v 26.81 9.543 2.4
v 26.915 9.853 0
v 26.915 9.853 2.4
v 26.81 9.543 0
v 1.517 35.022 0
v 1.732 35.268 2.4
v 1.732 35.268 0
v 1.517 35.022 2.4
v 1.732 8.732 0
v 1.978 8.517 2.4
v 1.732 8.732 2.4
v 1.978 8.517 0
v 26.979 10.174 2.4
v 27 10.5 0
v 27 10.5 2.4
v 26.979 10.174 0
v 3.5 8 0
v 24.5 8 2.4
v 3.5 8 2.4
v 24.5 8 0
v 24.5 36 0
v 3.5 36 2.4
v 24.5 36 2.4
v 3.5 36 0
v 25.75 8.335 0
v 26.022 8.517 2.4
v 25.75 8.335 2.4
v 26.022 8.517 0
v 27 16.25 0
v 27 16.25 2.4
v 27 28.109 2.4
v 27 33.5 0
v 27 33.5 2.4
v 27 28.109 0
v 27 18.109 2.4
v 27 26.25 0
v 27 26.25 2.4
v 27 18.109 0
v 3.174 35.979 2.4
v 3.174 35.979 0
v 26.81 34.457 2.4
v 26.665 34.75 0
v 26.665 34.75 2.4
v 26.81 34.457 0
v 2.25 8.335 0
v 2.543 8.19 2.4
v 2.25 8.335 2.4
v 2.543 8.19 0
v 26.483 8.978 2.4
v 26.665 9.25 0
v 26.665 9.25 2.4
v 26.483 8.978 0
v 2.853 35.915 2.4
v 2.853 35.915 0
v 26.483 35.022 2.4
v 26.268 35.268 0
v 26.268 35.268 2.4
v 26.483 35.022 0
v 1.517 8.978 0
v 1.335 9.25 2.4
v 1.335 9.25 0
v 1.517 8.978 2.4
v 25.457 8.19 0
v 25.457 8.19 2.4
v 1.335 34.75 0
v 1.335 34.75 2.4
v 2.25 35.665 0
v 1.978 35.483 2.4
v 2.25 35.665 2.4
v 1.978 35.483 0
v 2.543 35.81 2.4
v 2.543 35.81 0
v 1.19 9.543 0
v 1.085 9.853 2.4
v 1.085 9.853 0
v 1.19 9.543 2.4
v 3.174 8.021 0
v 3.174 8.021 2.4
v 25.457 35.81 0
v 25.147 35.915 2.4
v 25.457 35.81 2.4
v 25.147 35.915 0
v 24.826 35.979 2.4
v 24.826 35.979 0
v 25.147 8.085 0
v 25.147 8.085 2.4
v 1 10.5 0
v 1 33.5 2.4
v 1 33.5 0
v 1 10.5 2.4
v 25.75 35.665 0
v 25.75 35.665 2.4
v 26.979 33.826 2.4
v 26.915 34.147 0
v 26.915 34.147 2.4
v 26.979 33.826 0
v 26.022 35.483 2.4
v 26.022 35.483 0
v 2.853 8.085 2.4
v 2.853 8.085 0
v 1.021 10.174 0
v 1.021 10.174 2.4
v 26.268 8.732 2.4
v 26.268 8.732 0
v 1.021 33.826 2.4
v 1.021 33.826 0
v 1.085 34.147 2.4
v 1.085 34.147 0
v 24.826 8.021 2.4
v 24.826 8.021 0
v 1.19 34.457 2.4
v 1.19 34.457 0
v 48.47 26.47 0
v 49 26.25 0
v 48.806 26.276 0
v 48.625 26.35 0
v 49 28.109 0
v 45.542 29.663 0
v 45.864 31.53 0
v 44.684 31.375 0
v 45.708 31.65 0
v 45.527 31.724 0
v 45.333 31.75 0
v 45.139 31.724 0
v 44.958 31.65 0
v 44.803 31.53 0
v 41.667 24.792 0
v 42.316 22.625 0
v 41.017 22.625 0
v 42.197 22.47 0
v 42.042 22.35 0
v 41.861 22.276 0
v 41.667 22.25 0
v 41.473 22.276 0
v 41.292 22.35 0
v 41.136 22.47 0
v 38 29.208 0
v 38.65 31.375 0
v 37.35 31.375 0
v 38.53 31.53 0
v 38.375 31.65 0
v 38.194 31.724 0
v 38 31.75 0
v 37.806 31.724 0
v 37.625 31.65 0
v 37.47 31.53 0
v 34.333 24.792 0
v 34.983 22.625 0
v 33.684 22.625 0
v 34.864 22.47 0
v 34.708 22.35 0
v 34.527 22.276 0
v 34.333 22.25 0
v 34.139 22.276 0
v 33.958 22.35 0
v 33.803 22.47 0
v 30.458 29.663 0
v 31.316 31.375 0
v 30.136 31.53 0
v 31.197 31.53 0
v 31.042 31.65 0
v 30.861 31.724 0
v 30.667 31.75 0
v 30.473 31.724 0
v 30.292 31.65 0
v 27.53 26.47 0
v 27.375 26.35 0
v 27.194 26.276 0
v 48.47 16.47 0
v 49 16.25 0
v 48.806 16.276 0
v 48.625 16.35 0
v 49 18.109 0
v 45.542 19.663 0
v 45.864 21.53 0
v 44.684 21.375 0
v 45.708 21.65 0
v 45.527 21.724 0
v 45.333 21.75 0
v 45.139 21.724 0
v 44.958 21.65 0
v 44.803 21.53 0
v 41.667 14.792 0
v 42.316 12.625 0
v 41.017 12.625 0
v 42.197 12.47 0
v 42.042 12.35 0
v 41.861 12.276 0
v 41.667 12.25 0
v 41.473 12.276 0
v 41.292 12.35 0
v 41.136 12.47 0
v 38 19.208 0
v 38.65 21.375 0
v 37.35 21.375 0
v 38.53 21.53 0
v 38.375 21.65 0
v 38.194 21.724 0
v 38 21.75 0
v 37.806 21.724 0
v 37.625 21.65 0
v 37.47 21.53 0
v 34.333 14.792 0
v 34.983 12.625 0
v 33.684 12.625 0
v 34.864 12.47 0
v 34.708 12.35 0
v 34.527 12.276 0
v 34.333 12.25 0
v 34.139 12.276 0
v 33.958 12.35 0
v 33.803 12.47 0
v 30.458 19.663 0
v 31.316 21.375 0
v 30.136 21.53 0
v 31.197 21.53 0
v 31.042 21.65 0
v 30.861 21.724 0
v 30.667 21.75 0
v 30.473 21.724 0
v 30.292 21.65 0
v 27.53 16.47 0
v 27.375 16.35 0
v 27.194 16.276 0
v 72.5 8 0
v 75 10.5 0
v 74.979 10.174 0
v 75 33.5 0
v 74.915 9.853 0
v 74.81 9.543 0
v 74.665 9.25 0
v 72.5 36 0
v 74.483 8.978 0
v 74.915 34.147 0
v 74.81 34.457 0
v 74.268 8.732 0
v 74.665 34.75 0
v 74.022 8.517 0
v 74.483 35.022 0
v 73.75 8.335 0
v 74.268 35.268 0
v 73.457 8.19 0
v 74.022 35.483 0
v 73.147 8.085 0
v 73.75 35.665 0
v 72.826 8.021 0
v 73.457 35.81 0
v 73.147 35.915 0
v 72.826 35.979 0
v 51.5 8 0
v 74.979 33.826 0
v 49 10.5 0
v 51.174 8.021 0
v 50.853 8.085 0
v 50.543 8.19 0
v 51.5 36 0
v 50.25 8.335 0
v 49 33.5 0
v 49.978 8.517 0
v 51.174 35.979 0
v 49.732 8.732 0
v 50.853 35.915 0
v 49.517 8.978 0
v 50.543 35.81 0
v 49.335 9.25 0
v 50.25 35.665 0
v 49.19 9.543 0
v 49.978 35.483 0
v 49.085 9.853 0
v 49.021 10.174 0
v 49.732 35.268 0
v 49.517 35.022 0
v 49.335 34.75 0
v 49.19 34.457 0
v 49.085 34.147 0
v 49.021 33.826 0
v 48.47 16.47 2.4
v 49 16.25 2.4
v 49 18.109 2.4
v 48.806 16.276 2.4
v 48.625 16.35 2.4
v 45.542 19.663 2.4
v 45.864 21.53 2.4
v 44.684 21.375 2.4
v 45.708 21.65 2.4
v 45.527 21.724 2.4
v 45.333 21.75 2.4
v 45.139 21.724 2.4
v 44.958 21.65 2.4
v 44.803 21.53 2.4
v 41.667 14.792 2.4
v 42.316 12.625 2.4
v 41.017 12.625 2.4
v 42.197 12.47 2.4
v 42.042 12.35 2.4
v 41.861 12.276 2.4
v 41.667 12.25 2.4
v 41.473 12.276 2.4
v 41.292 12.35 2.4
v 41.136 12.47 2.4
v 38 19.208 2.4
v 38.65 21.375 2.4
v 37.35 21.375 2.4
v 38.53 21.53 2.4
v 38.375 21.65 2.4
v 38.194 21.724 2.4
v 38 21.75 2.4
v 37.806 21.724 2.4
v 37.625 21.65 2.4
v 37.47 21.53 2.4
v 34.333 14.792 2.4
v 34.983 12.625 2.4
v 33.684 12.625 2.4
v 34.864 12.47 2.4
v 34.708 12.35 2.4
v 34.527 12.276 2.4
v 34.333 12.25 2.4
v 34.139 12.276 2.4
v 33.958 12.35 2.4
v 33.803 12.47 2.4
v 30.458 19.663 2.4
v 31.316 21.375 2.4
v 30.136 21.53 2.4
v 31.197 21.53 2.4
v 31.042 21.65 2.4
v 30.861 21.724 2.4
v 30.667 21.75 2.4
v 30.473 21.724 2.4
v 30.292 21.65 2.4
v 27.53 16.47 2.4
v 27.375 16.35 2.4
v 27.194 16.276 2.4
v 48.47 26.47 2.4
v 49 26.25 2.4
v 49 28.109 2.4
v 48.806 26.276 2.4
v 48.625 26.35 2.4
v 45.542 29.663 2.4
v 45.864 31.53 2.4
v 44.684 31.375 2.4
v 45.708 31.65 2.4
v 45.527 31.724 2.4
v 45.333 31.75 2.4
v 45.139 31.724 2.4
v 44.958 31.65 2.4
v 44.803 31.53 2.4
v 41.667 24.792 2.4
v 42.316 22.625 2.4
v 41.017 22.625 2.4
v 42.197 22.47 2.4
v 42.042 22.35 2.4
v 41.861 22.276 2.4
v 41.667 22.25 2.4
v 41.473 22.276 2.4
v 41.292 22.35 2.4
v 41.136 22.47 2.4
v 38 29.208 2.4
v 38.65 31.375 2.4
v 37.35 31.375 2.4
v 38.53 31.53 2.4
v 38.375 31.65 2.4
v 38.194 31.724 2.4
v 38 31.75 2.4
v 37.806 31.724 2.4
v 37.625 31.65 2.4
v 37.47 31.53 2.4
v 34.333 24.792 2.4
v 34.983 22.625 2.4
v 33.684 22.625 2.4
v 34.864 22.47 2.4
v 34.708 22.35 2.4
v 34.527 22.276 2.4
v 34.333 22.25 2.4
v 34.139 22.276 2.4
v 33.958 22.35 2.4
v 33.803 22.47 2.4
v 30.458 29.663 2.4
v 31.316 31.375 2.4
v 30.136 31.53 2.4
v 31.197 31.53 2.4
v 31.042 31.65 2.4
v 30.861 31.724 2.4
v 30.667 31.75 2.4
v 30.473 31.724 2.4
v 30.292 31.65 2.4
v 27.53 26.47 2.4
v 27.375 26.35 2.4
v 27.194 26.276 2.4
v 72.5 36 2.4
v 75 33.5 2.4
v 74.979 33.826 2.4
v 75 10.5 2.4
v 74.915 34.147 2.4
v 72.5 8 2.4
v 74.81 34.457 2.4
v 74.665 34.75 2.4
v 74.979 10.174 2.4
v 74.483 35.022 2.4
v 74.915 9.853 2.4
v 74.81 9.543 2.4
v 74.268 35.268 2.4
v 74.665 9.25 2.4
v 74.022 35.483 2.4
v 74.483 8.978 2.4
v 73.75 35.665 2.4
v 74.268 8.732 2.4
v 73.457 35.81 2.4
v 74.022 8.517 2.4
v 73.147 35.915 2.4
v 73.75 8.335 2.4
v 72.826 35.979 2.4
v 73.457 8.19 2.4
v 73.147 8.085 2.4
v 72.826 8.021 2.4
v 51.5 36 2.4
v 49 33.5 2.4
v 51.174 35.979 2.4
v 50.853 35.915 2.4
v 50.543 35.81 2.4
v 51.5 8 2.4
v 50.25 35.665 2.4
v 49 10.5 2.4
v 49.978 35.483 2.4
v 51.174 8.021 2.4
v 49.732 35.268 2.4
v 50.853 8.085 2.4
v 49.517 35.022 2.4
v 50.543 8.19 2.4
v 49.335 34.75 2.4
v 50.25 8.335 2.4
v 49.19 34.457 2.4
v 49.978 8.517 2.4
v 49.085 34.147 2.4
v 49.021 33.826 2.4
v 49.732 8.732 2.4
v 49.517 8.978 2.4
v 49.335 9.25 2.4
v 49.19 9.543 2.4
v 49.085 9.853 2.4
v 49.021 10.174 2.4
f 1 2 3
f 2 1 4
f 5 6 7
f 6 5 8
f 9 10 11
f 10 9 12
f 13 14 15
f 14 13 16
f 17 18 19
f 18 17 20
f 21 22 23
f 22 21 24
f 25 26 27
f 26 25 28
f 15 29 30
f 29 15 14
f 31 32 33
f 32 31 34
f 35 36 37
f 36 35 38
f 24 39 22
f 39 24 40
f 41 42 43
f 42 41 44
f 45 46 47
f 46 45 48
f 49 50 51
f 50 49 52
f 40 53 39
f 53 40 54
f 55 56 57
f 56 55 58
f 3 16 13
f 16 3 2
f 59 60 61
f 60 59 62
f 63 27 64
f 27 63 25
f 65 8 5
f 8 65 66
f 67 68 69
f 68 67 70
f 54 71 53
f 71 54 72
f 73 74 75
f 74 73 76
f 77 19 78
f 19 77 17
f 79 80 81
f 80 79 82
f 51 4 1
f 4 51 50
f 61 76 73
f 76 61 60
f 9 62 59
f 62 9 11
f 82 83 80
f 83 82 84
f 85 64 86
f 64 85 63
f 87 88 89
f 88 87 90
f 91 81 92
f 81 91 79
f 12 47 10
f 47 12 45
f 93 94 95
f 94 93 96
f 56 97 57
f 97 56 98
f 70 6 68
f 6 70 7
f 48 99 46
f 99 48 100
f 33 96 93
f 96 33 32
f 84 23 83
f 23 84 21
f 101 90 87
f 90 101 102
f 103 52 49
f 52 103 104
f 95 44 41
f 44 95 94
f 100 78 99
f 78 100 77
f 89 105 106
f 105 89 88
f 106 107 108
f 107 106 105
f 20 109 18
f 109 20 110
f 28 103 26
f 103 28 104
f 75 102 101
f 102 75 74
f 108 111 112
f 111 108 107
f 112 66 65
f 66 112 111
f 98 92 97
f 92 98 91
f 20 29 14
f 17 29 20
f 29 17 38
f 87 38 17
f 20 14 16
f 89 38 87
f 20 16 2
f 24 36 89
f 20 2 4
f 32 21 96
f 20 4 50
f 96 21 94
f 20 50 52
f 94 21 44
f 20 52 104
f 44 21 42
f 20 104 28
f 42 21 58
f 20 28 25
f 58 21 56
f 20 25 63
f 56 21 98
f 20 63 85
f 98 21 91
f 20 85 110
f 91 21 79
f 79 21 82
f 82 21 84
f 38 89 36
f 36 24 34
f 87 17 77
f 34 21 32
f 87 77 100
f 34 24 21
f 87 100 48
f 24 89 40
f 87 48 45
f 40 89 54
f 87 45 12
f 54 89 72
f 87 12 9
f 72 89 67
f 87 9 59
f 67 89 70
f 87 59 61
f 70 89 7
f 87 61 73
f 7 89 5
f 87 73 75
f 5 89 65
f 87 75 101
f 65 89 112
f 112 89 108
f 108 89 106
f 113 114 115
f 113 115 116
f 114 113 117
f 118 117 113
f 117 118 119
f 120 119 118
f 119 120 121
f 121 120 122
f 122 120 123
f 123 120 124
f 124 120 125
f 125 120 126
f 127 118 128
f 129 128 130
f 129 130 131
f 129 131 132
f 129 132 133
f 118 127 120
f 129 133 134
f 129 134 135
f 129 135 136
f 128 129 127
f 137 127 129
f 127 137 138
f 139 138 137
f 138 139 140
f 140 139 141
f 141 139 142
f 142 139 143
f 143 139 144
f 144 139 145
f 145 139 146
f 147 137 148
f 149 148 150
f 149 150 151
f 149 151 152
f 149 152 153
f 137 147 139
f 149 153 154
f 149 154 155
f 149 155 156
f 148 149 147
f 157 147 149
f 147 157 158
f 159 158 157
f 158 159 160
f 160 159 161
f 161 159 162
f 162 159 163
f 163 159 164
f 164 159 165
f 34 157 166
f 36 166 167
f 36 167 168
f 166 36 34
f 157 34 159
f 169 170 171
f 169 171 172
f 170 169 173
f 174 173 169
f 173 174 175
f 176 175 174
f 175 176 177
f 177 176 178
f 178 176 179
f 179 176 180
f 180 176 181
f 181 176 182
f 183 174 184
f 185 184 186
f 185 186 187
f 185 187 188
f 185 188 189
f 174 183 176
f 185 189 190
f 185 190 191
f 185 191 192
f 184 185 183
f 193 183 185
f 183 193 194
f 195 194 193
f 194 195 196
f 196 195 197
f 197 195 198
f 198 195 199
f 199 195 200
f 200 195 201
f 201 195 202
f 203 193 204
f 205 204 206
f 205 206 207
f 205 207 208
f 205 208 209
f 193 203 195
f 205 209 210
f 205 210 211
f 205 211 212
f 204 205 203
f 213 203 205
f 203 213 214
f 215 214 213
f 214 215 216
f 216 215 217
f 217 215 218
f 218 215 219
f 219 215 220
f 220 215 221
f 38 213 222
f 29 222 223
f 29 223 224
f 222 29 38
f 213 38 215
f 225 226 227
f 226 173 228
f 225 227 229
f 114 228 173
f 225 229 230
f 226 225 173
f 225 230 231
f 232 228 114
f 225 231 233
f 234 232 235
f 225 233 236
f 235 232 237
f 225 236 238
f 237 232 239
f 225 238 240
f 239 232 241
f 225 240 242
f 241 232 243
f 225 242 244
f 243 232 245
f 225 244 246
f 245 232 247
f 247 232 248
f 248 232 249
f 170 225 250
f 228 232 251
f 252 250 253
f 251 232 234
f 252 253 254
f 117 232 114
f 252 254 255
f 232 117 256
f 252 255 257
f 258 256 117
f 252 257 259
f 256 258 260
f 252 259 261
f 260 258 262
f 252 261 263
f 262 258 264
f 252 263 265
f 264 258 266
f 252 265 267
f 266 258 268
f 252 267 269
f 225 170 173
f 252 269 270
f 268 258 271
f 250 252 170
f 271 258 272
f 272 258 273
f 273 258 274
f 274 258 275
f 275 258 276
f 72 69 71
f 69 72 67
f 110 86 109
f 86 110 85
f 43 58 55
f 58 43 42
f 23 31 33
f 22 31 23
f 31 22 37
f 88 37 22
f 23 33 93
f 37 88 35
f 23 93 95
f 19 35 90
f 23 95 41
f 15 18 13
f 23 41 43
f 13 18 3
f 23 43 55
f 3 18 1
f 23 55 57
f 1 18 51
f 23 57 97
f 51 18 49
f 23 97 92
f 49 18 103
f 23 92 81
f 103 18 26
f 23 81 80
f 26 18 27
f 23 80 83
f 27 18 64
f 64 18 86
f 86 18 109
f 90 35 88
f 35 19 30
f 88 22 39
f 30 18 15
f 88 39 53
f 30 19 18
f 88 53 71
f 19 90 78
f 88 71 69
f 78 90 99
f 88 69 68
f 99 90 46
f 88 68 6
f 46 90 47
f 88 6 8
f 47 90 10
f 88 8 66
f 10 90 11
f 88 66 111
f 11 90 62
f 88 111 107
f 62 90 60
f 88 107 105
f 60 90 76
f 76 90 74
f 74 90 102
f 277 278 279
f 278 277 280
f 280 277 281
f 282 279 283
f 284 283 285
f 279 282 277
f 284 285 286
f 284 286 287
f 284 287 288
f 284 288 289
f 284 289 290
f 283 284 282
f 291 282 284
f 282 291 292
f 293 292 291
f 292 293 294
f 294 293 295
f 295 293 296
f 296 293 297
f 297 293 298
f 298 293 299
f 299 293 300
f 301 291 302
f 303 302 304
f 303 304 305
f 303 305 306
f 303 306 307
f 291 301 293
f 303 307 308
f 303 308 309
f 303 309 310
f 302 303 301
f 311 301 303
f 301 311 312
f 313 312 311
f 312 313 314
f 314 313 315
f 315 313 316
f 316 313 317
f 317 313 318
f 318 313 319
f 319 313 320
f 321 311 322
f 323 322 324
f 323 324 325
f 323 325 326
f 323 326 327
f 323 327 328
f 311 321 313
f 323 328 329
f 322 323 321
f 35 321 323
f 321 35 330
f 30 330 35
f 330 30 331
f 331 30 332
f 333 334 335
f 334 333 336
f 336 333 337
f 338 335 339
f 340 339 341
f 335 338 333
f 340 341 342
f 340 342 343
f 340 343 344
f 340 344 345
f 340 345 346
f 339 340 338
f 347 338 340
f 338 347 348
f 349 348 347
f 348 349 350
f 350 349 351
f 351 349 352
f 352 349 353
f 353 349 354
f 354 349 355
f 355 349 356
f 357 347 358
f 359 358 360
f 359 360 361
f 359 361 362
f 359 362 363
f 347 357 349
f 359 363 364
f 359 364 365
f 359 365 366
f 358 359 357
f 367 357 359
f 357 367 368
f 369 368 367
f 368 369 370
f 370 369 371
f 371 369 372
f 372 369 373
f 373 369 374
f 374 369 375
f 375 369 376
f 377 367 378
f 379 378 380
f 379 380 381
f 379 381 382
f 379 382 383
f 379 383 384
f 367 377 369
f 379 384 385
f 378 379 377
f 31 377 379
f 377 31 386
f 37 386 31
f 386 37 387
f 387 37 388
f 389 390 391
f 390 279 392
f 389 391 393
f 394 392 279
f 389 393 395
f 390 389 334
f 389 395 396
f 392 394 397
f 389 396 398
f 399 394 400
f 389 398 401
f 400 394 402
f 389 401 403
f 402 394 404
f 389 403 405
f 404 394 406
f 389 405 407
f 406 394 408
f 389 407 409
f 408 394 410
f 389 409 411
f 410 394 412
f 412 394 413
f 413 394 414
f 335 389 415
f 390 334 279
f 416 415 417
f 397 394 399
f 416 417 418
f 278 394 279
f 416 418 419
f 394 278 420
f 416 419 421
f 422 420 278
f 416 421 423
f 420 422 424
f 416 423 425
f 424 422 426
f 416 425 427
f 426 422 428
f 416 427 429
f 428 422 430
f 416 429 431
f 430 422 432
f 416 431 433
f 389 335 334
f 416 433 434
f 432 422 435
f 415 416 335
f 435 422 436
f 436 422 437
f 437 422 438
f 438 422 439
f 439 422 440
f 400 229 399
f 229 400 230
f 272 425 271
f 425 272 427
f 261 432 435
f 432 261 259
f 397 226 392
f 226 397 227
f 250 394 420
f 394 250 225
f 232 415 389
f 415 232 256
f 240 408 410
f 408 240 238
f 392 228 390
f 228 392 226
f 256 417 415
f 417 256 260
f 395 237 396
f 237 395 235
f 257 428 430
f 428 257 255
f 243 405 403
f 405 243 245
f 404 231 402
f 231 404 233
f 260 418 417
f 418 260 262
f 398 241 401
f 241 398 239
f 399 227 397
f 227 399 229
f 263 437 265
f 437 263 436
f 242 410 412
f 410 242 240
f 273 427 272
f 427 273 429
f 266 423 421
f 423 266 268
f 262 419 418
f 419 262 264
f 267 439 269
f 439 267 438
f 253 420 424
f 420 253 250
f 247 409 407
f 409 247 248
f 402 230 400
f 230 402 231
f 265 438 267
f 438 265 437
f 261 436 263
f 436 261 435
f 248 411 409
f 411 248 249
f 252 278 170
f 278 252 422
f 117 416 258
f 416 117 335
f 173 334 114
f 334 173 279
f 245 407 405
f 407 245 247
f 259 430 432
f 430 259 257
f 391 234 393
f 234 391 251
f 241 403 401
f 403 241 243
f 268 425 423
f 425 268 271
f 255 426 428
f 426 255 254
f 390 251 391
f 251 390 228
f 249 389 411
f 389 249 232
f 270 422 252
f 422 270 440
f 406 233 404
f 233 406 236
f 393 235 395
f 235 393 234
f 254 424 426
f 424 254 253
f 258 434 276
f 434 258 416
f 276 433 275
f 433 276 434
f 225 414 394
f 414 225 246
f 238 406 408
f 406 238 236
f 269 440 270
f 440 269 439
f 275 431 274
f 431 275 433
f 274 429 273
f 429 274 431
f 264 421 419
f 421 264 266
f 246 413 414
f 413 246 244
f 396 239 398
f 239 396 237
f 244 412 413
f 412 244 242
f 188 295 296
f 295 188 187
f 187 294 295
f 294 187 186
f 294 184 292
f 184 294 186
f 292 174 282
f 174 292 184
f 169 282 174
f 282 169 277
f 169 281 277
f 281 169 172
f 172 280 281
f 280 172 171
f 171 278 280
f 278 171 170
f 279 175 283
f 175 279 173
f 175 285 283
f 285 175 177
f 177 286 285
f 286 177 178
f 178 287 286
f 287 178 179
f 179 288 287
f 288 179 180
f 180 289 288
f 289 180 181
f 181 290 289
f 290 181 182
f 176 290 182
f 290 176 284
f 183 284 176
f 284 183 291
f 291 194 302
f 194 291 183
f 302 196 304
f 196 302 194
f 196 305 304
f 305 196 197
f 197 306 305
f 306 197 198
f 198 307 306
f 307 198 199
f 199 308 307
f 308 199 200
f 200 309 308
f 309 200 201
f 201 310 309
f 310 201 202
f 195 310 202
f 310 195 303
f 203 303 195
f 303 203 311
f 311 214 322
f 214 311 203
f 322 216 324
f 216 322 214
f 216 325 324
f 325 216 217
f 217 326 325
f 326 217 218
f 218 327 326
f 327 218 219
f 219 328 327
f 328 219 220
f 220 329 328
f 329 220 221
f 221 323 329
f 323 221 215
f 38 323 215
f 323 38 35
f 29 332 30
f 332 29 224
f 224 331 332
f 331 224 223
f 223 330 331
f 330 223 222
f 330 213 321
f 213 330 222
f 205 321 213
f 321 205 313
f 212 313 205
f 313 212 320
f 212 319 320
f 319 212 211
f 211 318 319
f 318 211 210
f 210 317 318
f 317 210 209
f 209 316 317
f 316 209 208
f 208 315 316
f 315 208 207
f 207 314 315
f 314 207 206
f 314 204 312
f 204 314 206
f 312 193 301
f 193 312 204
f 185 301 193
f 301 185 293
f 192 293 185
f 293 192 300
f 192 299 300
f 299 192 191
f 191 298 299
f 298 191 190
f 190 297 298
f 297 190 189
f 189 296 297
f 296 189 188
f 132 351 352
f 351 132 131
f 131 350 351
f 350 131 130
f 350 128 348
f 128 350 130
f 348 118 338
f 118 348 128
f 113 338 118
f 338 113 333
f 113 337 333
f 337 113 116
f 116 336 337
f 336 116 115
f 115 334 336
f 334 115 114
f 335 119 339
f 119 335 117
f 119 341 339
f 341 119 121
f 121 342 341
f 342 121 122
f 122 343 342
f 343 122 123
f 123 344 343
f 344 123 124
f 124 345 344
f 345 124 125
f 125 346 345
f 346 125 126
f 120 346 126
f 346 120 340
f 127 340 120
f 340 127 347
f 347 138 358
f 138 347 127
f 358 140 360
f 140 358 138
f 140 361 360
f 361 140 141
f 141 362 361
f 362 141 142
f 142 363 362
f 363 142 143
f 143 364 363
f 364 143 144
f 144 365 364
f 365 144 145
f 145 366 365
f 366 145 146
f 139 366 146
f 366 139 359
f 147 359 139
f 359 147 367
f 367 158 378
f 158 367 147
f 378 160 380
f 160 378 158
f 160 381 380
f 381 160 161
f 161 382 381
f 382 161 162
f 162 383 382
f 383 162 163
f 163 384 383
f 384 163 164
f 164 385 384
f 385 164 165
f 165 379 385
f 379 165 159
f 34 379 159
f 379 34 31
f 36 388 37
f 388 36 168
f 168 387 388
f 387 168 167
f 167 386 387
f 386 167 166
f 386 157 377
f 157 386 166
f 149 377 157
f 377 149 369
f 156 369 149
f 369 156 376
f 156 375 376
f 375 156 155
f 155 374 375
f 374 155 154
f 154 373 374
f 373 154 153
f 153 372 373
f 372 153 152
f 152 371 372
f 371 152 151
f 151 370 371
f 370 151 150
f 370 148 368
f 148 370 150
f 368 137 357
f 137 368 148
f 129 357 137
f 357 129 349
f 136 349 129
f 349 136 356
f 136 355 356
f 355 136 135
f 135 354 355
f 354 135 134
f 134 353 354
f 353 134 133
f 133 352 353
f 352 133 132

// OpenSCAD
/*
Sample 016: Serpentinen-Filmgelenk — 1,5 mm Bahn
Generated from the FDM Mechanical Sample Library.
Units: millimetres.

Override examples:
  openscad -o custom.stl -D 'view="plate"' -D 'render_fn=64' model.scad
  openscad -o preview.png -D 'view="assembly"' model.scad
*/
use <../../../library/fdm_mechanisms.scad>

render_fn = is_undef(render_fn) ? 48 : render_fn;
view = is_undef(view) ? "plate" : view;
$fn = render_fn;

sample_serpentine_hinge(
    view=view,
    beam_w=1.5,
    gap=22
);
